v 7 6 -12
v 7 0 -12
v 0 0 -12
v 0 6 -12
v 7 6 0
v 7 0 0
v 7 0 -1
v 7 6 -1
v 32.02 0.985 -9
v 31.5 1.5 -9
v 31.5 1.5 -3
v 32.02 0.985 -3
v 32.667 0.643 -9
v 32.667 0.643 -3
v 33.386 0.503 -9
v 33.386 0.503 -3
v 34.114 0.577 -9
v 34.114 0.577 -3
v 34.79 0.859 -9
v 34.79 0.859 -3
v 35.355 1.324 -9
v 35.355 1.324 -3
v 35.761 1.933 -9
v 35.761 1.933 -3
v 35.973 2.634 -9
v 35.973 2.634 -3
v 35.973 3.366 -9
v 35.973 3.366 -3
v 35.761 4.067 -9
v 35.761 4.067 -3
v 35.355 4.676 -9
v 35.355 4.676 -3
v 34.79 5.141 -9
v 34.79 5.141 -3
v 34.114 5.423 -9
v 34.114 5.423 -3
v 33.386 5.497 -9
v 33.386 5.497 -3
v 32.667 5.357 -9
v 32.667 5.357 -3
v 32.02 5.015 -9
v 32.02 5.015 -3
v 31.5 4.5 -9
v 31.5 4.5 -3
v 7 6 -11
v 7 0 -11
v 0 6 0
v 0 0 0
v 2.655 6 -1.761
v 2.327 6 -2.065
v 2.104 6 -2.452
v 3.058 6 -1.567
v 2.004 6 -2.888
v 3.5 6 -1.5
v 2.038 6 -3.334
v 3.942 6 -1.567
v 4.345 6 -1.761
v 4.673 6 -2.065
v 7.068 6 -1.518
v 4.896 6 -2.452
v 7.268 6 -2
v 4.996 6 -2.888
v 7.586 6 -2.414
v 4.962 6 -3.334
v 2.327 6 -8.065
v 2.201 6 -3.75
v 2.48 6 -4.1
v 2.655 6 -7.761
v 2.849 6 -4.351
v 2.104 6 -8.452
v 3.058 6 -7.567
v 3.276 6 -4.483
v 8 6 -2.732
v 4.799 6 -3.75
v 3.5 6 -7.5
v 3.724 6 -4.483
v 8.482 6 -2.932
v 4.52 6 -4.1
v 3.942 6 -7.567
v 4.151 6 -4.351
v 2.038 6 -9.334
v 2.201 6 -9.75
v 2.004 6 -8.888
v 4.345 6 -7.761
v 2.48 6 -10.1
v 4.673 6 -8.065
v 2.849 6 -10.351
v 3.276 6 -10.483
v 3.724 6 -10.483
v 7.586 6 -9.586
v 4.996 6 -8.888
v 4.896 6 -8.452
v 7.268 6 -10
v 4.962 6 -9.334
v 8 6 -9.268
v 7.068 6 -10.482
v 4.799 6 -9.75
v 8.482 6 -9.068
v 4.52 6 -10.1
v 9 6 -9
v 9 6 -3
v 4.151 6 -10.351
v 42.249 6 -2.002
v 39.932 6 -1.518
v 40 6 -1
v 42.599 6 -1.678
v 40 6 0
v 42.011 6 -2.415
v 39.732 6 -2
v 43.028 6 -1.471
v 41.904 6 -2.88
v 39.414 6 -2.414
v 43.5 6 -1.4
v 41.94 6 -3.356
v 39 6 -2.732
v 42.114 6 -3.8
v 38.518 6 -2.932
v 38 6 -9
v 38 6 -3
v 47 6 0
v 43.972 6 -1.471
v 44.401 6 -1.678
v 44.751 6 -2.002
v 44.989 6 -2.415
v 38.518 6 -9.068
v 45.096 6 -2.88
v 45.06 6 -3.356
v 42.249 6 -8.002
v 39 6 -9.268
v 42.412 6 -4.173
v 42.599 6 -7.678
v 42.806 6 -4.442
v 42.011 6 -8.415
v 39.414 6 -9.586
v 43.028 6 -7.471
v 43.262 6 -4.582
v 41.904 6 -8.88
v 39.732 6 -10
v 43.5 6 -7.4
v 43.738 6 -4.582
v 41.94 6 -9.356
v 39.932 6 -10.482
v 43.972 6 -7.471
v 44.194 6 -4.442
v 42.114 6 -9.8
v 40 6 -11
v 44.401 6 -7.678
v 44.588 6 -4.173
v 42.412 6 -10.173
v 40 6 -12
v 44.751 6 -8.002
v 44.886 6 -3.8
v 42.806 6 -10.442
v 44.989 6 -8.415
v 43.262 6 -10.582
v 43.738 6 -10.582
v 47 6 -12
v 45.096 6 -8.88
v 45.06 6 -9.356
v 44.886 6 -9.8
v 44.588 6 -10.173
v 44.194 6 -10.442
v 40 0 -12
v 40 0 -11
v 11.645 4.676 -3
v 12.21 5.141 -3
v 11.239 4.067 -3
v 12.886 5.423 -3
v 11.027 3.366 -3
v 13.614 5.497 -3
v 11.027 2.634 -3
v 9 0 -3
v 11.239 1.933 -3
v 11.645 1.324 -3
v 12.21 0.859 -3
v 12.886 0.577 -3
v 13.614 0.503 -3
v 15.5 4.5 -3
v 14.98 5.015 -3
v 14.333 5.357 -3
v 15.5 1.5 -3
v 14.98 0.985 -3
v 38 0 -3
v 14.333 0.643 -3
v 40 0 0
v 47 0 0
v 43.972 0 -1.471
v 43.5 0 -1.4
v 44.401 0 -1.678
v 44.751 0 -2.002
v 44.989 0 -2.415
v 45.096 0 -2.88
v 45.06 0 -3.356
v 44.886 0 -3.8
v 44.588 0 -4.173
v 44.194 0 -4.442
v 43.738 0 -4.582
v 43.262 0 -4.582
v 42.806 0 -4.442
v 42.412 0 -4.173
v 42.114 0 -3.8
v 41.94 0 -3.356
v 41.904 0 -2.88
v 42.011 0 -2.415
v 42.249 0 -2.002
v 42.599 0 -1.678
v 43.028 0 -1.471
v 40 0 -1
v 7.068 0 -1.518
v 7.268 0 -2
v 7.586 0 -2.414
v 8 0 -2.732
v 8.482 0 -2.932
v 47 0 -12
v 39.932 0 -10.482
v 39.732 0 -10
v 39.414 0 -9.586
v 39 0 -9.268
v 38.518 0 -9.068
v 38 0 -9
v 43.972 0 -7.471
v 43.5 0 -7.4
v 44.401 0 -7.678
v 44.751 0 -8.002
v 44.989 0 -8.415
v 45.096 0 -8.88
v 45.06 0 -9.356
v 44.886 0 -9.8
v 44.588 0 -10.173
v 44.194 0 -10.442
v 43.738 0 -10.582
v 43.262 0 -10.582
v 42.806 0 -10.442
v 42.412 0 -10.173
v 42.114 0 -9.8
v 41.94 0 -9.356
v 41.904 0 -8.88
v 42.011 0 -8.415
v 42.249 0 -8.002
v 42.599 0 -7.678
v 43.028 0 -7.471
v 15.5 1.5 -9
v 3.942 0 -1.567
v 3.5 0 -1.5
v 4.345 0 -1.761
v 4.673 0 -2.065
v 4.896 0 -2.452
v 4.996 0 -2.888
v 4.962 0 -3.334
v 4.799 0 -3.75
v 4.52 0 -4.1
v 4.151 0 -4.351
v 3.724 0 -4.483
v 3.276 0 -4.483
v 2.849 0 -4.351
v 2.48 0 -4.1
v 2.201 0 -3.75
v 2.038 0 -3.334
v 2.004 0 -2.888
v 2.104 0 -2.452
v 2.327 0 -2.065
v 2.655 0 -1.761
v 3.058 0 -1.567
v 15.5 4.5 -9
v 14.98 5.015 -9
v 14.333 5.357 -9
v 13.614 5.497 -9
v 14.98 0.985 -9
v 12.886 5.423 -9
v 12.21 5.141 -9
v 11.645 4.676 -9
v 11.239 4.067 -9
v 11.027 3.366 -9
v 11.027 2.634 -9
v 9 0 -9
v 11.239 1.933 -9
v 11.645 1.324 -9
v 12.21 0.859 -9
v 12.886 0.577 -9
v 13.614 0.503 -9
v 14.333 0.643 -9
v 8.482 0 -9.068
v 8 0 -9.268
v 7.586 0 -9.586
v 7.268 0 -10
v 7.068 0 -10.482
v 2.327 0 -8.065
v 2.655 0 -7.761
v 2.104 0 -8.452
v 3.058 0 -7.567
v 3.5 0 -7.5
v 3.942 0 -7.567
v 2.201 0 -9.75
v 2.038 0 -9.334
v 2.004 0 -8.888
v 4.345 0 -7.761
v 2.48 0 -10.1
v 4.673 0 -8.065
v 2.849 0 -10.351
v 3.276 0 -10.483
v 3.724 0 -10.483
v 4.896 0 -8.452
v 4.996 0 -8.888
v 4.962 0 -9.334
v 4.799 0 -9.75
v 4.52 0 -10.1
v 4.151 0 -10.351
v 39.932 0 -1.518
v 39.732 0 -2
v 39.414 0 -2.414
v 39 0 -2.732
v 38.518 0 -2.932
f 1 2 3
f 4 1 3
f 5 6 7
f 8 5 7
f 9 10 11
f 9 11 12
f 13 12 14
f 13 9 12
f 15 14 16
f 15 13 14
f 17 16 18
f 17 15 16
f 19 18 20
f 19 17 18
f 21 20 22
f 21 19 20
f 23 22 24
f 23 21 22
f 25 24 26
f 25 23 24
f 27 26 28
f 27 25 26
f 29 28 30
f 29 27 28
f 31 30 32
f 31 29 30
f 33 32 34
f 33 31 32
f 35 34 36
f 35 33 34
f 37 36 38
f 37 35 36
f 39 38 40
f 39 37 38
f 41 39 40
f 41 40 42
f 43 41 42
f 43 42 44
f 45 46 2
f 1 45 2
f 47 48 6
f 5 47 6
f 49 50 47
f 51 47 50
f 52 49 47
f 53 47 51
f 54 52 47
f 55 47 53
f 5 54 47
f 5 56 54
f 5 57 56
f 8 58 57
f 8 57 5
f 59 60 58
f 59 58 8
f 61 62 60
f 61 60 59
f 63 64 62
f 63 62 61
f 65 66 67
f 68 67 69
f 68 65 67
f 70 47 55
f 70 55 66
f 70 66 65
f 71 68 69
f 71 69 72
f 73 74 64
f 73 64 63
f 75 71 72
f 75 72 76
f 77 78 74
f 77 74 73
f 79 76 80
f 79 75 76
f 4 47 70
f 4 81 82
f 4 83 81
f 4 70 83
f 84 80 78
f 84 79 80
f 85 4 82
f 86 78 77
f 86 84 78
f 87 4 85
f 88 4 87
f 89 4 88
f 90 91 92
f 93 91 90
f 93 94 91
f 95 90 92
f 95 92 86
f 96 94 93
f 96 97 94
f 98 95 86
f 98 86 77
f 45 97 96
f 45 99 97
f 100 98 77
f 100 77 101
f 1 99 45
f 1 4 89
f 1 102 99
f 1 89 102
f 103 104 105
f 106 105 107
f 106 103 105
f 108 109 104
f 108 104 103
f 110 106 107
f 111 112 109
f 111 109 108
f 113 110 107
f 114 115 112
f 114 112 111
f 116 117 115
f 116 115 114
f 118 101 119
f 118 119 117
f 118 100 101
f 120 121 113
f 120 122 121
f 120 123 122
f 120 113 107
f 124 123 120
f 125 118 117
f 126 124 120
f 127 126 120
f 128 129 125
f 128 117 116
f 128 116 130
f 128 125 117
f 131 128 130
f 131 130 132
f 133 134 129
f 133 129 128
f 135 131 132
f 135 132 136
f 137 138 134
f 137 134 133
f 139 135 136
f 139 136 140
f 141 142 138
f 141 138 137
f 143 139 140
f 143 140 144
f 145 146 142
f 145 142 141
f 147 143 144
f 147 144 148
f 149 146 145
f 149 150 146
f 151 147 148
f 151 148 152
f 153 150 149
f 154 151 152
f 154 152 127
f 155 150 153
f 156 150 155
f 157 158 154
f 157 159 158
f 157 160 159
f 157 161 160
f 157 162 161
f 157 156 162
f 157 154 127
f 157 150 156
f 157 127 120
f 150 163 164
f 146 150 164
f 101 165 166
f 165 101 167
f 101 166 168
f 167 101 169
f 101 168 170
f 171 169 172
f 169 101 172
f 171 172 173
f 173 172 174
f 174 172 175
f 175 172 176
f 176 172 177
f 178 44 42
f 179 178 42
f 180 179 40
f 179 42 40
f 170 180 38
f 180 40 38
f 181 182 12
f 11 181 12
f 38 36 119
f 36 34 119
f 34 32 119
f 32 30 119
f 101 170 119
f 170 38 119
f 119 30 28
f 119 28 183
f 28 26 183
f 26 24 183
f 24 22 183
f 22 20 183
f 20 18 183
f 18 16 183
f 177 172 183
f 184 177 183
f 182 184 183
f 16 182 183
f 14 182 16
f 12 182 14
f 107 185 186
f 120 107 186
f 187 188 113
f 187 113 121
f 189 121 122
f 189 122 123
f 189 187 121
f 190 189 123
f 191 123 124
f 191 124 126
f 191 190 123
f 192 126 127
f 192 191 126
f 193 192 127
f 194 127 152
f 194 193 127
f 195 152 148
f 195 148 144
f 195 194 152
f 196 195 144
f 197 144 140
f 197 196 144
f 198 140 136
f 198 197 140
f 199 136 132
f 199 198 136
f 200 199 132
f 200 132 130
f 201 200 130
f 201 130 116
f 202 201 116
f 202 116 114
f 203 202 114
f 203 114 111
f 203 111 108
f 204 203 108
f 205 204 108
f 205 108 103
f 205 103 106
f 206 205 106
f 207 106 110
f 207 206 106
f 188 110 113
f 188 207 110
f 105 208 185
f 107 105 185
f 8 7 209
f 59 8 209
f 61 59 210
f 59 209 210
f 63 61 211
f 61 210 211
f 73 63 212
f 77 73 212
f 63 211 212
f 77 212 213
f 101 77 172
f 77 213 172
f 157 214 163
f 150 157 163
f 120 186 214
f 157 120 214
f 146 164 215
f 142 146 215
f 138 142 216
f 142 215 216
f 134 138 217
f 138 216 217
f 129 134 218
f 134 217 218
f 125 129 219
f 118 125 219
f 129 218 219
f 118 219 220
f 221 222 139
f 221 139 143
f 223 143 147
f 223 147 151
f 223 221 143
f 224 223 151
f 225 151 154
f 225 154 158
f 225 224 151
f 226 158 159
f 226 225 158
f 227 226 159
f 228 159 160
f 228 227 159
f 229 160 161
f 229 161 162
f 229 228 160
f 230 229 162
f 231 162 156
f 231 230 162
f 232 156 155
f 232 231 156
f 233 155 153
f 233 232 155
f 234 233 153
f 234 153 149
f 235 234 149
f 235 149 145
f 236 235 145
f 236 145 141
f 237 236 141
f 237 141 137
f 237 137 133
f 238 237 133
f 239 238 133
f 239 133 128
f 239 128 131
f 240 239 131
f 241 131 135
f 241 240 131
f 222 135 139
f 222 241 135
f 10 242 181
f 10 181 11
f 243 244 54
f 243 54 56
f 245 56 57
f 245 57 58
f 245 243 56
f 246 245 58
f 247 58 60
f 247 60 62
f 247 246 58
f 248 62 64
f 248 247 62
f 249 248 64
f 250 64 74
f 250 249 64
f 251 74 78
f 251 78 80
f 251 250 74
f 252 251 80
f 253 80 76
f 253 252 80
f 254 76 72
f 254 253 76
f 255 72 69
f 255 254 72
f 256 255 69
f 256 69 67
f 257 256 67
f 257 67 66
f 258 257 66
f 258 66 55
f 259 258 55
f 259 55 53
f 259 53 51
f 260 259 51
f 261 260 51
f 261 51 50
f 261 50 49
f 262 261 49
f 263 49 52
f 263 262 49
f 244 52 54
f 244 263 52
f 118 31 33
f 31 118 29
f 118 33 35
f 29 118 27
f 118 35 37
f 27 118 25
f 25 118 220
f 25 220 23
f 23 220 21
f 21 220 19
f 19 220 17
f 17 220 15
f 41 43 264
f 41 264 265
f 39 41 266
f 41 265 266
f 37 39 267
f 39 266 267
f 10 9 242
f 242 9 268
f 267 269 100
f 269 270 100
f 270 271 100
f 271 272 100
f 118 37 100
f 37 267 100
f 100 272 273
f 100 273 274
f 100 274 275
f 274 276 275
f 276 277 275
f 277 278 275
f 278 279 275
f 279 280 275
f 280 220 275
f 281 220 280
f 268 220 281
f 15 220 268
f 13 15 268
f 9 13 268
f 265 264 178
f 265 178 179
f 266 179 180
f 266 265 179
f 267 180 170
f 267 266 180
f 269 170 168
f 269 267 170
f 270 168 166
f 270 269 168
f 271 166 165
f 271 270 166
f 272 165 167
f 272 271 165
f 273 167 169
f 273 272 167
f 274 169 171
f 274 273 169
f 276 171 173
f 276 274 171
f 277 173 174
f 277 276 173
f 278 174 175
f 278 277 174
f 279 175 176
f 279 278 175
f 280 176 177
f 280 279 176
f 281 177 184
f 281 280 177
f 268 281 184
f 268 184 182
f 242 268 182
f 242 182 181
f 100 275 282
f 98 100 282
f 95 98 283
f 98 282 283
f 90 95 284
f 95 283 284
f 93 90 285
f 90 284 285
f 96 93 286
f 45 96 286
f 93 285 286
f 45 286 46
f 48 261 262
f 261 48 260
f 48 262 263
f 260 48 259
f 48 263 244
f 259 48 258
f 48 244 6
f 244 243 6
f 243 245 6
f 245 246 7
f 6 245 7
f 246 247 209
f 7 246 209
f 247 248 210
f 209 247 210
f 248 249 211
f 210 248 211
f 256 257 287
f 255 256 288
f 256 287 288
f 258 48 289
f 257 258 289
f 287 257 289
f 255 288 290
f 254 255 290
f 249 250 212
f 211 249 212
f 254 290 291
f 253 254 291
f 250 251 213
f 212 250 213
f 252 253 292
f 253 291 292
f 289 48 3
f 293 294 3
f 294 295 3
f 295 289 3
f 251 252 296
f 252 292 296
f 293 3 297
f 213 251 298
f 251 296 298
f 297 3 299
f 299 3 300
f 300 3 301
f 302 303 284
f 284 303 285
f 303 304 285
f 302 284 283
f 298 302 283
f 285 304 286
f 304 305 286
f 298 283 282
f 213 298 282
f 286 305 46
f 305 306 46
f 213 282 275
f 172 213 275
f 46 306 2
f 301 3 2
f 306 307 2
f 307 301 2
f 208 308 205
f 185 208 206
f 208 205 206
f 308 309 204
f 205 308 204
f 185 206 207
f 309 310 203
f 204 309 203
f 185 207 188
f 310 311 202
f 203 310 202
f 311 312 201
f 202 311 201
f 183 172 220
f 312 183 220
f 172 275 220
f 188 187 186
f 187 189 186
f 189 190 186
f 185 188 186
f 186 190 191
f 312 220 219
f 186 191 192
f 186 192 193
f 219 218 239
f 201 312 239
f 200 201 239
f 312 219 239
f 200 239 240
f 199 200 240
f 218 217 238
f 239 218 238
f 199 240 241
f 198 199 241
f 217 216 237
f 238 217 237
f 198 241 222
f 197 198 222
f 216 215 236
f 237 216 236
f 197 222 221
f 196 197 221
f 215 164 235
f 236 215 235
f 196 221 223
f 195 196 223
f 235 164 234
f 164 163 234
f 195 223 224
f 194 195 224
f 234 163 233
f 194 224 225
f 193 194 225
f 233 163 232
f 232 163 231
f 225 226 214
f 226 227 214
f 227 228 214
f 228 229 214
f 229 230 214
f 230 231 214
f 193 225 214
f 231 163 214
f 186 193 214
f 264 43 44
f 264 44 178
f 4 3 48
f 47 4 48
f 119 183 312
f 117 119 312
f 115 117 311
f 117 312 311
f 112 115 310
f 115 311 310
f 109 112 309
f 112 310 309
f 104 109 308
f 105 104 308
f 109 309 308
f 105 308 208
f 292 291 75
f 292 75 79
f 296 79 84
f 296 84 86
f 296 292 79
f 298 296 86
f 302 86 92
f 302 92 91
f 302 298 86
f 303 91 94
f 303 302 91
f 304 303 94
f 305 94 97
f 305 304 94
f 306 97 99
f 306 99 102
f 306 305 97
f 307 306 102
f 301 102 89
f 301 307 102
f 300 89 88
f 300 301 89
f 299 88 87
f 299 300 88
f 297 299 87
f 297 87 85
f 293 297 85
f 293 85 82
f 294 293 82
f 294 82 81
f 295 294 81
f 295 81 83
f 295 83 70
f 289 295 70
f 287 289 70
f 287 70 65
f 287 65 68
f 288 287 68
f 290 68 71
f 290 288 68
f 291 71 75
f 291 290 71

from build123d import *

# Parameters (mm, degrees)
SKETCH1_R           = 1.5
SKETCH1_R_2         = 1.6
BOSS_EXTRUDE2_DEPTH = 6
CUT_EXTRUDE1_DEPTH  = 49.228622207


with BuildPart() as part:
    # Sketch1 → Boss-Extrude2 (new body)
    with BuildSketch(Plane(origin=(0, 0, 0), x_dir=(1, 0, 0), z_dir=(0, 1, 0))):
        with BuildLine():
            Line((40, 0), (47, 0))
            Line((47, 0), (47, 12))
            Line((47, 12), (40, 12))
            Line((40, 12), (40, 11))
            ThreePointArc((40, 11), (39.414213562, 9.585786438), (38, 9))
            Line((38, 9), (9, 9))
            ThreePointArc((9, 9), (7.585786438, 9.585786438), (7, 11))
            Line((7, 11), (7, 12))
            Line((7, 12), (0, 12))
            Line((0, 12), (0, 0))
            Line((0, 0), (7, 0))
            Line((7, 0), (7, 1))
            ThreePointArc((7, 1), (7.585786438, 2.414213562), (9, 3))
            Line((9, 3), (38, 3))
            ThreePointArc((38, 3), (39.414213562, 2.414213562), (40, 1))
            Line((40, 1), (40, 0))
        make_face()
        with Locations(Location((3.5, 9, 0), (0, 0, 270))):
            Circle(SKETCH1_R, mode=Mode.SUBTRACT)
        with Locations(Location((3.5, 3, 0), (0, 0, 270))):
            Circle(SKETCH1_R, mode=Mode.SUBTRACT)
        with Locations(Location((43.5, 9, 0), (0, 0, 270))):
            Circle(SKETCH1_R_2, mode=Mode.SUBTRACT)
        with Locations(Location((43.5, 3, 0), (0, 0, 270))):
            Circle(SKETCH1_R_2, mode=Mode.SUBTRACT)
    extrude(amount=BOSS_EXTRUDE2_DEPTH)

    # Sketch2 → Cut-Extrude1 (cut, through all)
    with BuildSketch(Plane(origin=(0, 0, -9), x_dir=(-1, 0, 0), z_dir=(0, 0, -1))):
        with BuildLine():
            Line((-31.5, 4.5), (-15.5, 4.5))
            ThreePointArc((-15.5, 4.5), (-11, 3), (-15.5, 1.5))
            Line((-15.5, 1.5), (-31.5, 1.5))
            ThreePointArc((-31.5, 1.5), (-36, 3), (-31.5, 4.5))
        make_face()
    extrude(amount=-CUT_EXTRUDE1_DEPTH, mode=Mode.SUBTRACT)


solid = part.part
